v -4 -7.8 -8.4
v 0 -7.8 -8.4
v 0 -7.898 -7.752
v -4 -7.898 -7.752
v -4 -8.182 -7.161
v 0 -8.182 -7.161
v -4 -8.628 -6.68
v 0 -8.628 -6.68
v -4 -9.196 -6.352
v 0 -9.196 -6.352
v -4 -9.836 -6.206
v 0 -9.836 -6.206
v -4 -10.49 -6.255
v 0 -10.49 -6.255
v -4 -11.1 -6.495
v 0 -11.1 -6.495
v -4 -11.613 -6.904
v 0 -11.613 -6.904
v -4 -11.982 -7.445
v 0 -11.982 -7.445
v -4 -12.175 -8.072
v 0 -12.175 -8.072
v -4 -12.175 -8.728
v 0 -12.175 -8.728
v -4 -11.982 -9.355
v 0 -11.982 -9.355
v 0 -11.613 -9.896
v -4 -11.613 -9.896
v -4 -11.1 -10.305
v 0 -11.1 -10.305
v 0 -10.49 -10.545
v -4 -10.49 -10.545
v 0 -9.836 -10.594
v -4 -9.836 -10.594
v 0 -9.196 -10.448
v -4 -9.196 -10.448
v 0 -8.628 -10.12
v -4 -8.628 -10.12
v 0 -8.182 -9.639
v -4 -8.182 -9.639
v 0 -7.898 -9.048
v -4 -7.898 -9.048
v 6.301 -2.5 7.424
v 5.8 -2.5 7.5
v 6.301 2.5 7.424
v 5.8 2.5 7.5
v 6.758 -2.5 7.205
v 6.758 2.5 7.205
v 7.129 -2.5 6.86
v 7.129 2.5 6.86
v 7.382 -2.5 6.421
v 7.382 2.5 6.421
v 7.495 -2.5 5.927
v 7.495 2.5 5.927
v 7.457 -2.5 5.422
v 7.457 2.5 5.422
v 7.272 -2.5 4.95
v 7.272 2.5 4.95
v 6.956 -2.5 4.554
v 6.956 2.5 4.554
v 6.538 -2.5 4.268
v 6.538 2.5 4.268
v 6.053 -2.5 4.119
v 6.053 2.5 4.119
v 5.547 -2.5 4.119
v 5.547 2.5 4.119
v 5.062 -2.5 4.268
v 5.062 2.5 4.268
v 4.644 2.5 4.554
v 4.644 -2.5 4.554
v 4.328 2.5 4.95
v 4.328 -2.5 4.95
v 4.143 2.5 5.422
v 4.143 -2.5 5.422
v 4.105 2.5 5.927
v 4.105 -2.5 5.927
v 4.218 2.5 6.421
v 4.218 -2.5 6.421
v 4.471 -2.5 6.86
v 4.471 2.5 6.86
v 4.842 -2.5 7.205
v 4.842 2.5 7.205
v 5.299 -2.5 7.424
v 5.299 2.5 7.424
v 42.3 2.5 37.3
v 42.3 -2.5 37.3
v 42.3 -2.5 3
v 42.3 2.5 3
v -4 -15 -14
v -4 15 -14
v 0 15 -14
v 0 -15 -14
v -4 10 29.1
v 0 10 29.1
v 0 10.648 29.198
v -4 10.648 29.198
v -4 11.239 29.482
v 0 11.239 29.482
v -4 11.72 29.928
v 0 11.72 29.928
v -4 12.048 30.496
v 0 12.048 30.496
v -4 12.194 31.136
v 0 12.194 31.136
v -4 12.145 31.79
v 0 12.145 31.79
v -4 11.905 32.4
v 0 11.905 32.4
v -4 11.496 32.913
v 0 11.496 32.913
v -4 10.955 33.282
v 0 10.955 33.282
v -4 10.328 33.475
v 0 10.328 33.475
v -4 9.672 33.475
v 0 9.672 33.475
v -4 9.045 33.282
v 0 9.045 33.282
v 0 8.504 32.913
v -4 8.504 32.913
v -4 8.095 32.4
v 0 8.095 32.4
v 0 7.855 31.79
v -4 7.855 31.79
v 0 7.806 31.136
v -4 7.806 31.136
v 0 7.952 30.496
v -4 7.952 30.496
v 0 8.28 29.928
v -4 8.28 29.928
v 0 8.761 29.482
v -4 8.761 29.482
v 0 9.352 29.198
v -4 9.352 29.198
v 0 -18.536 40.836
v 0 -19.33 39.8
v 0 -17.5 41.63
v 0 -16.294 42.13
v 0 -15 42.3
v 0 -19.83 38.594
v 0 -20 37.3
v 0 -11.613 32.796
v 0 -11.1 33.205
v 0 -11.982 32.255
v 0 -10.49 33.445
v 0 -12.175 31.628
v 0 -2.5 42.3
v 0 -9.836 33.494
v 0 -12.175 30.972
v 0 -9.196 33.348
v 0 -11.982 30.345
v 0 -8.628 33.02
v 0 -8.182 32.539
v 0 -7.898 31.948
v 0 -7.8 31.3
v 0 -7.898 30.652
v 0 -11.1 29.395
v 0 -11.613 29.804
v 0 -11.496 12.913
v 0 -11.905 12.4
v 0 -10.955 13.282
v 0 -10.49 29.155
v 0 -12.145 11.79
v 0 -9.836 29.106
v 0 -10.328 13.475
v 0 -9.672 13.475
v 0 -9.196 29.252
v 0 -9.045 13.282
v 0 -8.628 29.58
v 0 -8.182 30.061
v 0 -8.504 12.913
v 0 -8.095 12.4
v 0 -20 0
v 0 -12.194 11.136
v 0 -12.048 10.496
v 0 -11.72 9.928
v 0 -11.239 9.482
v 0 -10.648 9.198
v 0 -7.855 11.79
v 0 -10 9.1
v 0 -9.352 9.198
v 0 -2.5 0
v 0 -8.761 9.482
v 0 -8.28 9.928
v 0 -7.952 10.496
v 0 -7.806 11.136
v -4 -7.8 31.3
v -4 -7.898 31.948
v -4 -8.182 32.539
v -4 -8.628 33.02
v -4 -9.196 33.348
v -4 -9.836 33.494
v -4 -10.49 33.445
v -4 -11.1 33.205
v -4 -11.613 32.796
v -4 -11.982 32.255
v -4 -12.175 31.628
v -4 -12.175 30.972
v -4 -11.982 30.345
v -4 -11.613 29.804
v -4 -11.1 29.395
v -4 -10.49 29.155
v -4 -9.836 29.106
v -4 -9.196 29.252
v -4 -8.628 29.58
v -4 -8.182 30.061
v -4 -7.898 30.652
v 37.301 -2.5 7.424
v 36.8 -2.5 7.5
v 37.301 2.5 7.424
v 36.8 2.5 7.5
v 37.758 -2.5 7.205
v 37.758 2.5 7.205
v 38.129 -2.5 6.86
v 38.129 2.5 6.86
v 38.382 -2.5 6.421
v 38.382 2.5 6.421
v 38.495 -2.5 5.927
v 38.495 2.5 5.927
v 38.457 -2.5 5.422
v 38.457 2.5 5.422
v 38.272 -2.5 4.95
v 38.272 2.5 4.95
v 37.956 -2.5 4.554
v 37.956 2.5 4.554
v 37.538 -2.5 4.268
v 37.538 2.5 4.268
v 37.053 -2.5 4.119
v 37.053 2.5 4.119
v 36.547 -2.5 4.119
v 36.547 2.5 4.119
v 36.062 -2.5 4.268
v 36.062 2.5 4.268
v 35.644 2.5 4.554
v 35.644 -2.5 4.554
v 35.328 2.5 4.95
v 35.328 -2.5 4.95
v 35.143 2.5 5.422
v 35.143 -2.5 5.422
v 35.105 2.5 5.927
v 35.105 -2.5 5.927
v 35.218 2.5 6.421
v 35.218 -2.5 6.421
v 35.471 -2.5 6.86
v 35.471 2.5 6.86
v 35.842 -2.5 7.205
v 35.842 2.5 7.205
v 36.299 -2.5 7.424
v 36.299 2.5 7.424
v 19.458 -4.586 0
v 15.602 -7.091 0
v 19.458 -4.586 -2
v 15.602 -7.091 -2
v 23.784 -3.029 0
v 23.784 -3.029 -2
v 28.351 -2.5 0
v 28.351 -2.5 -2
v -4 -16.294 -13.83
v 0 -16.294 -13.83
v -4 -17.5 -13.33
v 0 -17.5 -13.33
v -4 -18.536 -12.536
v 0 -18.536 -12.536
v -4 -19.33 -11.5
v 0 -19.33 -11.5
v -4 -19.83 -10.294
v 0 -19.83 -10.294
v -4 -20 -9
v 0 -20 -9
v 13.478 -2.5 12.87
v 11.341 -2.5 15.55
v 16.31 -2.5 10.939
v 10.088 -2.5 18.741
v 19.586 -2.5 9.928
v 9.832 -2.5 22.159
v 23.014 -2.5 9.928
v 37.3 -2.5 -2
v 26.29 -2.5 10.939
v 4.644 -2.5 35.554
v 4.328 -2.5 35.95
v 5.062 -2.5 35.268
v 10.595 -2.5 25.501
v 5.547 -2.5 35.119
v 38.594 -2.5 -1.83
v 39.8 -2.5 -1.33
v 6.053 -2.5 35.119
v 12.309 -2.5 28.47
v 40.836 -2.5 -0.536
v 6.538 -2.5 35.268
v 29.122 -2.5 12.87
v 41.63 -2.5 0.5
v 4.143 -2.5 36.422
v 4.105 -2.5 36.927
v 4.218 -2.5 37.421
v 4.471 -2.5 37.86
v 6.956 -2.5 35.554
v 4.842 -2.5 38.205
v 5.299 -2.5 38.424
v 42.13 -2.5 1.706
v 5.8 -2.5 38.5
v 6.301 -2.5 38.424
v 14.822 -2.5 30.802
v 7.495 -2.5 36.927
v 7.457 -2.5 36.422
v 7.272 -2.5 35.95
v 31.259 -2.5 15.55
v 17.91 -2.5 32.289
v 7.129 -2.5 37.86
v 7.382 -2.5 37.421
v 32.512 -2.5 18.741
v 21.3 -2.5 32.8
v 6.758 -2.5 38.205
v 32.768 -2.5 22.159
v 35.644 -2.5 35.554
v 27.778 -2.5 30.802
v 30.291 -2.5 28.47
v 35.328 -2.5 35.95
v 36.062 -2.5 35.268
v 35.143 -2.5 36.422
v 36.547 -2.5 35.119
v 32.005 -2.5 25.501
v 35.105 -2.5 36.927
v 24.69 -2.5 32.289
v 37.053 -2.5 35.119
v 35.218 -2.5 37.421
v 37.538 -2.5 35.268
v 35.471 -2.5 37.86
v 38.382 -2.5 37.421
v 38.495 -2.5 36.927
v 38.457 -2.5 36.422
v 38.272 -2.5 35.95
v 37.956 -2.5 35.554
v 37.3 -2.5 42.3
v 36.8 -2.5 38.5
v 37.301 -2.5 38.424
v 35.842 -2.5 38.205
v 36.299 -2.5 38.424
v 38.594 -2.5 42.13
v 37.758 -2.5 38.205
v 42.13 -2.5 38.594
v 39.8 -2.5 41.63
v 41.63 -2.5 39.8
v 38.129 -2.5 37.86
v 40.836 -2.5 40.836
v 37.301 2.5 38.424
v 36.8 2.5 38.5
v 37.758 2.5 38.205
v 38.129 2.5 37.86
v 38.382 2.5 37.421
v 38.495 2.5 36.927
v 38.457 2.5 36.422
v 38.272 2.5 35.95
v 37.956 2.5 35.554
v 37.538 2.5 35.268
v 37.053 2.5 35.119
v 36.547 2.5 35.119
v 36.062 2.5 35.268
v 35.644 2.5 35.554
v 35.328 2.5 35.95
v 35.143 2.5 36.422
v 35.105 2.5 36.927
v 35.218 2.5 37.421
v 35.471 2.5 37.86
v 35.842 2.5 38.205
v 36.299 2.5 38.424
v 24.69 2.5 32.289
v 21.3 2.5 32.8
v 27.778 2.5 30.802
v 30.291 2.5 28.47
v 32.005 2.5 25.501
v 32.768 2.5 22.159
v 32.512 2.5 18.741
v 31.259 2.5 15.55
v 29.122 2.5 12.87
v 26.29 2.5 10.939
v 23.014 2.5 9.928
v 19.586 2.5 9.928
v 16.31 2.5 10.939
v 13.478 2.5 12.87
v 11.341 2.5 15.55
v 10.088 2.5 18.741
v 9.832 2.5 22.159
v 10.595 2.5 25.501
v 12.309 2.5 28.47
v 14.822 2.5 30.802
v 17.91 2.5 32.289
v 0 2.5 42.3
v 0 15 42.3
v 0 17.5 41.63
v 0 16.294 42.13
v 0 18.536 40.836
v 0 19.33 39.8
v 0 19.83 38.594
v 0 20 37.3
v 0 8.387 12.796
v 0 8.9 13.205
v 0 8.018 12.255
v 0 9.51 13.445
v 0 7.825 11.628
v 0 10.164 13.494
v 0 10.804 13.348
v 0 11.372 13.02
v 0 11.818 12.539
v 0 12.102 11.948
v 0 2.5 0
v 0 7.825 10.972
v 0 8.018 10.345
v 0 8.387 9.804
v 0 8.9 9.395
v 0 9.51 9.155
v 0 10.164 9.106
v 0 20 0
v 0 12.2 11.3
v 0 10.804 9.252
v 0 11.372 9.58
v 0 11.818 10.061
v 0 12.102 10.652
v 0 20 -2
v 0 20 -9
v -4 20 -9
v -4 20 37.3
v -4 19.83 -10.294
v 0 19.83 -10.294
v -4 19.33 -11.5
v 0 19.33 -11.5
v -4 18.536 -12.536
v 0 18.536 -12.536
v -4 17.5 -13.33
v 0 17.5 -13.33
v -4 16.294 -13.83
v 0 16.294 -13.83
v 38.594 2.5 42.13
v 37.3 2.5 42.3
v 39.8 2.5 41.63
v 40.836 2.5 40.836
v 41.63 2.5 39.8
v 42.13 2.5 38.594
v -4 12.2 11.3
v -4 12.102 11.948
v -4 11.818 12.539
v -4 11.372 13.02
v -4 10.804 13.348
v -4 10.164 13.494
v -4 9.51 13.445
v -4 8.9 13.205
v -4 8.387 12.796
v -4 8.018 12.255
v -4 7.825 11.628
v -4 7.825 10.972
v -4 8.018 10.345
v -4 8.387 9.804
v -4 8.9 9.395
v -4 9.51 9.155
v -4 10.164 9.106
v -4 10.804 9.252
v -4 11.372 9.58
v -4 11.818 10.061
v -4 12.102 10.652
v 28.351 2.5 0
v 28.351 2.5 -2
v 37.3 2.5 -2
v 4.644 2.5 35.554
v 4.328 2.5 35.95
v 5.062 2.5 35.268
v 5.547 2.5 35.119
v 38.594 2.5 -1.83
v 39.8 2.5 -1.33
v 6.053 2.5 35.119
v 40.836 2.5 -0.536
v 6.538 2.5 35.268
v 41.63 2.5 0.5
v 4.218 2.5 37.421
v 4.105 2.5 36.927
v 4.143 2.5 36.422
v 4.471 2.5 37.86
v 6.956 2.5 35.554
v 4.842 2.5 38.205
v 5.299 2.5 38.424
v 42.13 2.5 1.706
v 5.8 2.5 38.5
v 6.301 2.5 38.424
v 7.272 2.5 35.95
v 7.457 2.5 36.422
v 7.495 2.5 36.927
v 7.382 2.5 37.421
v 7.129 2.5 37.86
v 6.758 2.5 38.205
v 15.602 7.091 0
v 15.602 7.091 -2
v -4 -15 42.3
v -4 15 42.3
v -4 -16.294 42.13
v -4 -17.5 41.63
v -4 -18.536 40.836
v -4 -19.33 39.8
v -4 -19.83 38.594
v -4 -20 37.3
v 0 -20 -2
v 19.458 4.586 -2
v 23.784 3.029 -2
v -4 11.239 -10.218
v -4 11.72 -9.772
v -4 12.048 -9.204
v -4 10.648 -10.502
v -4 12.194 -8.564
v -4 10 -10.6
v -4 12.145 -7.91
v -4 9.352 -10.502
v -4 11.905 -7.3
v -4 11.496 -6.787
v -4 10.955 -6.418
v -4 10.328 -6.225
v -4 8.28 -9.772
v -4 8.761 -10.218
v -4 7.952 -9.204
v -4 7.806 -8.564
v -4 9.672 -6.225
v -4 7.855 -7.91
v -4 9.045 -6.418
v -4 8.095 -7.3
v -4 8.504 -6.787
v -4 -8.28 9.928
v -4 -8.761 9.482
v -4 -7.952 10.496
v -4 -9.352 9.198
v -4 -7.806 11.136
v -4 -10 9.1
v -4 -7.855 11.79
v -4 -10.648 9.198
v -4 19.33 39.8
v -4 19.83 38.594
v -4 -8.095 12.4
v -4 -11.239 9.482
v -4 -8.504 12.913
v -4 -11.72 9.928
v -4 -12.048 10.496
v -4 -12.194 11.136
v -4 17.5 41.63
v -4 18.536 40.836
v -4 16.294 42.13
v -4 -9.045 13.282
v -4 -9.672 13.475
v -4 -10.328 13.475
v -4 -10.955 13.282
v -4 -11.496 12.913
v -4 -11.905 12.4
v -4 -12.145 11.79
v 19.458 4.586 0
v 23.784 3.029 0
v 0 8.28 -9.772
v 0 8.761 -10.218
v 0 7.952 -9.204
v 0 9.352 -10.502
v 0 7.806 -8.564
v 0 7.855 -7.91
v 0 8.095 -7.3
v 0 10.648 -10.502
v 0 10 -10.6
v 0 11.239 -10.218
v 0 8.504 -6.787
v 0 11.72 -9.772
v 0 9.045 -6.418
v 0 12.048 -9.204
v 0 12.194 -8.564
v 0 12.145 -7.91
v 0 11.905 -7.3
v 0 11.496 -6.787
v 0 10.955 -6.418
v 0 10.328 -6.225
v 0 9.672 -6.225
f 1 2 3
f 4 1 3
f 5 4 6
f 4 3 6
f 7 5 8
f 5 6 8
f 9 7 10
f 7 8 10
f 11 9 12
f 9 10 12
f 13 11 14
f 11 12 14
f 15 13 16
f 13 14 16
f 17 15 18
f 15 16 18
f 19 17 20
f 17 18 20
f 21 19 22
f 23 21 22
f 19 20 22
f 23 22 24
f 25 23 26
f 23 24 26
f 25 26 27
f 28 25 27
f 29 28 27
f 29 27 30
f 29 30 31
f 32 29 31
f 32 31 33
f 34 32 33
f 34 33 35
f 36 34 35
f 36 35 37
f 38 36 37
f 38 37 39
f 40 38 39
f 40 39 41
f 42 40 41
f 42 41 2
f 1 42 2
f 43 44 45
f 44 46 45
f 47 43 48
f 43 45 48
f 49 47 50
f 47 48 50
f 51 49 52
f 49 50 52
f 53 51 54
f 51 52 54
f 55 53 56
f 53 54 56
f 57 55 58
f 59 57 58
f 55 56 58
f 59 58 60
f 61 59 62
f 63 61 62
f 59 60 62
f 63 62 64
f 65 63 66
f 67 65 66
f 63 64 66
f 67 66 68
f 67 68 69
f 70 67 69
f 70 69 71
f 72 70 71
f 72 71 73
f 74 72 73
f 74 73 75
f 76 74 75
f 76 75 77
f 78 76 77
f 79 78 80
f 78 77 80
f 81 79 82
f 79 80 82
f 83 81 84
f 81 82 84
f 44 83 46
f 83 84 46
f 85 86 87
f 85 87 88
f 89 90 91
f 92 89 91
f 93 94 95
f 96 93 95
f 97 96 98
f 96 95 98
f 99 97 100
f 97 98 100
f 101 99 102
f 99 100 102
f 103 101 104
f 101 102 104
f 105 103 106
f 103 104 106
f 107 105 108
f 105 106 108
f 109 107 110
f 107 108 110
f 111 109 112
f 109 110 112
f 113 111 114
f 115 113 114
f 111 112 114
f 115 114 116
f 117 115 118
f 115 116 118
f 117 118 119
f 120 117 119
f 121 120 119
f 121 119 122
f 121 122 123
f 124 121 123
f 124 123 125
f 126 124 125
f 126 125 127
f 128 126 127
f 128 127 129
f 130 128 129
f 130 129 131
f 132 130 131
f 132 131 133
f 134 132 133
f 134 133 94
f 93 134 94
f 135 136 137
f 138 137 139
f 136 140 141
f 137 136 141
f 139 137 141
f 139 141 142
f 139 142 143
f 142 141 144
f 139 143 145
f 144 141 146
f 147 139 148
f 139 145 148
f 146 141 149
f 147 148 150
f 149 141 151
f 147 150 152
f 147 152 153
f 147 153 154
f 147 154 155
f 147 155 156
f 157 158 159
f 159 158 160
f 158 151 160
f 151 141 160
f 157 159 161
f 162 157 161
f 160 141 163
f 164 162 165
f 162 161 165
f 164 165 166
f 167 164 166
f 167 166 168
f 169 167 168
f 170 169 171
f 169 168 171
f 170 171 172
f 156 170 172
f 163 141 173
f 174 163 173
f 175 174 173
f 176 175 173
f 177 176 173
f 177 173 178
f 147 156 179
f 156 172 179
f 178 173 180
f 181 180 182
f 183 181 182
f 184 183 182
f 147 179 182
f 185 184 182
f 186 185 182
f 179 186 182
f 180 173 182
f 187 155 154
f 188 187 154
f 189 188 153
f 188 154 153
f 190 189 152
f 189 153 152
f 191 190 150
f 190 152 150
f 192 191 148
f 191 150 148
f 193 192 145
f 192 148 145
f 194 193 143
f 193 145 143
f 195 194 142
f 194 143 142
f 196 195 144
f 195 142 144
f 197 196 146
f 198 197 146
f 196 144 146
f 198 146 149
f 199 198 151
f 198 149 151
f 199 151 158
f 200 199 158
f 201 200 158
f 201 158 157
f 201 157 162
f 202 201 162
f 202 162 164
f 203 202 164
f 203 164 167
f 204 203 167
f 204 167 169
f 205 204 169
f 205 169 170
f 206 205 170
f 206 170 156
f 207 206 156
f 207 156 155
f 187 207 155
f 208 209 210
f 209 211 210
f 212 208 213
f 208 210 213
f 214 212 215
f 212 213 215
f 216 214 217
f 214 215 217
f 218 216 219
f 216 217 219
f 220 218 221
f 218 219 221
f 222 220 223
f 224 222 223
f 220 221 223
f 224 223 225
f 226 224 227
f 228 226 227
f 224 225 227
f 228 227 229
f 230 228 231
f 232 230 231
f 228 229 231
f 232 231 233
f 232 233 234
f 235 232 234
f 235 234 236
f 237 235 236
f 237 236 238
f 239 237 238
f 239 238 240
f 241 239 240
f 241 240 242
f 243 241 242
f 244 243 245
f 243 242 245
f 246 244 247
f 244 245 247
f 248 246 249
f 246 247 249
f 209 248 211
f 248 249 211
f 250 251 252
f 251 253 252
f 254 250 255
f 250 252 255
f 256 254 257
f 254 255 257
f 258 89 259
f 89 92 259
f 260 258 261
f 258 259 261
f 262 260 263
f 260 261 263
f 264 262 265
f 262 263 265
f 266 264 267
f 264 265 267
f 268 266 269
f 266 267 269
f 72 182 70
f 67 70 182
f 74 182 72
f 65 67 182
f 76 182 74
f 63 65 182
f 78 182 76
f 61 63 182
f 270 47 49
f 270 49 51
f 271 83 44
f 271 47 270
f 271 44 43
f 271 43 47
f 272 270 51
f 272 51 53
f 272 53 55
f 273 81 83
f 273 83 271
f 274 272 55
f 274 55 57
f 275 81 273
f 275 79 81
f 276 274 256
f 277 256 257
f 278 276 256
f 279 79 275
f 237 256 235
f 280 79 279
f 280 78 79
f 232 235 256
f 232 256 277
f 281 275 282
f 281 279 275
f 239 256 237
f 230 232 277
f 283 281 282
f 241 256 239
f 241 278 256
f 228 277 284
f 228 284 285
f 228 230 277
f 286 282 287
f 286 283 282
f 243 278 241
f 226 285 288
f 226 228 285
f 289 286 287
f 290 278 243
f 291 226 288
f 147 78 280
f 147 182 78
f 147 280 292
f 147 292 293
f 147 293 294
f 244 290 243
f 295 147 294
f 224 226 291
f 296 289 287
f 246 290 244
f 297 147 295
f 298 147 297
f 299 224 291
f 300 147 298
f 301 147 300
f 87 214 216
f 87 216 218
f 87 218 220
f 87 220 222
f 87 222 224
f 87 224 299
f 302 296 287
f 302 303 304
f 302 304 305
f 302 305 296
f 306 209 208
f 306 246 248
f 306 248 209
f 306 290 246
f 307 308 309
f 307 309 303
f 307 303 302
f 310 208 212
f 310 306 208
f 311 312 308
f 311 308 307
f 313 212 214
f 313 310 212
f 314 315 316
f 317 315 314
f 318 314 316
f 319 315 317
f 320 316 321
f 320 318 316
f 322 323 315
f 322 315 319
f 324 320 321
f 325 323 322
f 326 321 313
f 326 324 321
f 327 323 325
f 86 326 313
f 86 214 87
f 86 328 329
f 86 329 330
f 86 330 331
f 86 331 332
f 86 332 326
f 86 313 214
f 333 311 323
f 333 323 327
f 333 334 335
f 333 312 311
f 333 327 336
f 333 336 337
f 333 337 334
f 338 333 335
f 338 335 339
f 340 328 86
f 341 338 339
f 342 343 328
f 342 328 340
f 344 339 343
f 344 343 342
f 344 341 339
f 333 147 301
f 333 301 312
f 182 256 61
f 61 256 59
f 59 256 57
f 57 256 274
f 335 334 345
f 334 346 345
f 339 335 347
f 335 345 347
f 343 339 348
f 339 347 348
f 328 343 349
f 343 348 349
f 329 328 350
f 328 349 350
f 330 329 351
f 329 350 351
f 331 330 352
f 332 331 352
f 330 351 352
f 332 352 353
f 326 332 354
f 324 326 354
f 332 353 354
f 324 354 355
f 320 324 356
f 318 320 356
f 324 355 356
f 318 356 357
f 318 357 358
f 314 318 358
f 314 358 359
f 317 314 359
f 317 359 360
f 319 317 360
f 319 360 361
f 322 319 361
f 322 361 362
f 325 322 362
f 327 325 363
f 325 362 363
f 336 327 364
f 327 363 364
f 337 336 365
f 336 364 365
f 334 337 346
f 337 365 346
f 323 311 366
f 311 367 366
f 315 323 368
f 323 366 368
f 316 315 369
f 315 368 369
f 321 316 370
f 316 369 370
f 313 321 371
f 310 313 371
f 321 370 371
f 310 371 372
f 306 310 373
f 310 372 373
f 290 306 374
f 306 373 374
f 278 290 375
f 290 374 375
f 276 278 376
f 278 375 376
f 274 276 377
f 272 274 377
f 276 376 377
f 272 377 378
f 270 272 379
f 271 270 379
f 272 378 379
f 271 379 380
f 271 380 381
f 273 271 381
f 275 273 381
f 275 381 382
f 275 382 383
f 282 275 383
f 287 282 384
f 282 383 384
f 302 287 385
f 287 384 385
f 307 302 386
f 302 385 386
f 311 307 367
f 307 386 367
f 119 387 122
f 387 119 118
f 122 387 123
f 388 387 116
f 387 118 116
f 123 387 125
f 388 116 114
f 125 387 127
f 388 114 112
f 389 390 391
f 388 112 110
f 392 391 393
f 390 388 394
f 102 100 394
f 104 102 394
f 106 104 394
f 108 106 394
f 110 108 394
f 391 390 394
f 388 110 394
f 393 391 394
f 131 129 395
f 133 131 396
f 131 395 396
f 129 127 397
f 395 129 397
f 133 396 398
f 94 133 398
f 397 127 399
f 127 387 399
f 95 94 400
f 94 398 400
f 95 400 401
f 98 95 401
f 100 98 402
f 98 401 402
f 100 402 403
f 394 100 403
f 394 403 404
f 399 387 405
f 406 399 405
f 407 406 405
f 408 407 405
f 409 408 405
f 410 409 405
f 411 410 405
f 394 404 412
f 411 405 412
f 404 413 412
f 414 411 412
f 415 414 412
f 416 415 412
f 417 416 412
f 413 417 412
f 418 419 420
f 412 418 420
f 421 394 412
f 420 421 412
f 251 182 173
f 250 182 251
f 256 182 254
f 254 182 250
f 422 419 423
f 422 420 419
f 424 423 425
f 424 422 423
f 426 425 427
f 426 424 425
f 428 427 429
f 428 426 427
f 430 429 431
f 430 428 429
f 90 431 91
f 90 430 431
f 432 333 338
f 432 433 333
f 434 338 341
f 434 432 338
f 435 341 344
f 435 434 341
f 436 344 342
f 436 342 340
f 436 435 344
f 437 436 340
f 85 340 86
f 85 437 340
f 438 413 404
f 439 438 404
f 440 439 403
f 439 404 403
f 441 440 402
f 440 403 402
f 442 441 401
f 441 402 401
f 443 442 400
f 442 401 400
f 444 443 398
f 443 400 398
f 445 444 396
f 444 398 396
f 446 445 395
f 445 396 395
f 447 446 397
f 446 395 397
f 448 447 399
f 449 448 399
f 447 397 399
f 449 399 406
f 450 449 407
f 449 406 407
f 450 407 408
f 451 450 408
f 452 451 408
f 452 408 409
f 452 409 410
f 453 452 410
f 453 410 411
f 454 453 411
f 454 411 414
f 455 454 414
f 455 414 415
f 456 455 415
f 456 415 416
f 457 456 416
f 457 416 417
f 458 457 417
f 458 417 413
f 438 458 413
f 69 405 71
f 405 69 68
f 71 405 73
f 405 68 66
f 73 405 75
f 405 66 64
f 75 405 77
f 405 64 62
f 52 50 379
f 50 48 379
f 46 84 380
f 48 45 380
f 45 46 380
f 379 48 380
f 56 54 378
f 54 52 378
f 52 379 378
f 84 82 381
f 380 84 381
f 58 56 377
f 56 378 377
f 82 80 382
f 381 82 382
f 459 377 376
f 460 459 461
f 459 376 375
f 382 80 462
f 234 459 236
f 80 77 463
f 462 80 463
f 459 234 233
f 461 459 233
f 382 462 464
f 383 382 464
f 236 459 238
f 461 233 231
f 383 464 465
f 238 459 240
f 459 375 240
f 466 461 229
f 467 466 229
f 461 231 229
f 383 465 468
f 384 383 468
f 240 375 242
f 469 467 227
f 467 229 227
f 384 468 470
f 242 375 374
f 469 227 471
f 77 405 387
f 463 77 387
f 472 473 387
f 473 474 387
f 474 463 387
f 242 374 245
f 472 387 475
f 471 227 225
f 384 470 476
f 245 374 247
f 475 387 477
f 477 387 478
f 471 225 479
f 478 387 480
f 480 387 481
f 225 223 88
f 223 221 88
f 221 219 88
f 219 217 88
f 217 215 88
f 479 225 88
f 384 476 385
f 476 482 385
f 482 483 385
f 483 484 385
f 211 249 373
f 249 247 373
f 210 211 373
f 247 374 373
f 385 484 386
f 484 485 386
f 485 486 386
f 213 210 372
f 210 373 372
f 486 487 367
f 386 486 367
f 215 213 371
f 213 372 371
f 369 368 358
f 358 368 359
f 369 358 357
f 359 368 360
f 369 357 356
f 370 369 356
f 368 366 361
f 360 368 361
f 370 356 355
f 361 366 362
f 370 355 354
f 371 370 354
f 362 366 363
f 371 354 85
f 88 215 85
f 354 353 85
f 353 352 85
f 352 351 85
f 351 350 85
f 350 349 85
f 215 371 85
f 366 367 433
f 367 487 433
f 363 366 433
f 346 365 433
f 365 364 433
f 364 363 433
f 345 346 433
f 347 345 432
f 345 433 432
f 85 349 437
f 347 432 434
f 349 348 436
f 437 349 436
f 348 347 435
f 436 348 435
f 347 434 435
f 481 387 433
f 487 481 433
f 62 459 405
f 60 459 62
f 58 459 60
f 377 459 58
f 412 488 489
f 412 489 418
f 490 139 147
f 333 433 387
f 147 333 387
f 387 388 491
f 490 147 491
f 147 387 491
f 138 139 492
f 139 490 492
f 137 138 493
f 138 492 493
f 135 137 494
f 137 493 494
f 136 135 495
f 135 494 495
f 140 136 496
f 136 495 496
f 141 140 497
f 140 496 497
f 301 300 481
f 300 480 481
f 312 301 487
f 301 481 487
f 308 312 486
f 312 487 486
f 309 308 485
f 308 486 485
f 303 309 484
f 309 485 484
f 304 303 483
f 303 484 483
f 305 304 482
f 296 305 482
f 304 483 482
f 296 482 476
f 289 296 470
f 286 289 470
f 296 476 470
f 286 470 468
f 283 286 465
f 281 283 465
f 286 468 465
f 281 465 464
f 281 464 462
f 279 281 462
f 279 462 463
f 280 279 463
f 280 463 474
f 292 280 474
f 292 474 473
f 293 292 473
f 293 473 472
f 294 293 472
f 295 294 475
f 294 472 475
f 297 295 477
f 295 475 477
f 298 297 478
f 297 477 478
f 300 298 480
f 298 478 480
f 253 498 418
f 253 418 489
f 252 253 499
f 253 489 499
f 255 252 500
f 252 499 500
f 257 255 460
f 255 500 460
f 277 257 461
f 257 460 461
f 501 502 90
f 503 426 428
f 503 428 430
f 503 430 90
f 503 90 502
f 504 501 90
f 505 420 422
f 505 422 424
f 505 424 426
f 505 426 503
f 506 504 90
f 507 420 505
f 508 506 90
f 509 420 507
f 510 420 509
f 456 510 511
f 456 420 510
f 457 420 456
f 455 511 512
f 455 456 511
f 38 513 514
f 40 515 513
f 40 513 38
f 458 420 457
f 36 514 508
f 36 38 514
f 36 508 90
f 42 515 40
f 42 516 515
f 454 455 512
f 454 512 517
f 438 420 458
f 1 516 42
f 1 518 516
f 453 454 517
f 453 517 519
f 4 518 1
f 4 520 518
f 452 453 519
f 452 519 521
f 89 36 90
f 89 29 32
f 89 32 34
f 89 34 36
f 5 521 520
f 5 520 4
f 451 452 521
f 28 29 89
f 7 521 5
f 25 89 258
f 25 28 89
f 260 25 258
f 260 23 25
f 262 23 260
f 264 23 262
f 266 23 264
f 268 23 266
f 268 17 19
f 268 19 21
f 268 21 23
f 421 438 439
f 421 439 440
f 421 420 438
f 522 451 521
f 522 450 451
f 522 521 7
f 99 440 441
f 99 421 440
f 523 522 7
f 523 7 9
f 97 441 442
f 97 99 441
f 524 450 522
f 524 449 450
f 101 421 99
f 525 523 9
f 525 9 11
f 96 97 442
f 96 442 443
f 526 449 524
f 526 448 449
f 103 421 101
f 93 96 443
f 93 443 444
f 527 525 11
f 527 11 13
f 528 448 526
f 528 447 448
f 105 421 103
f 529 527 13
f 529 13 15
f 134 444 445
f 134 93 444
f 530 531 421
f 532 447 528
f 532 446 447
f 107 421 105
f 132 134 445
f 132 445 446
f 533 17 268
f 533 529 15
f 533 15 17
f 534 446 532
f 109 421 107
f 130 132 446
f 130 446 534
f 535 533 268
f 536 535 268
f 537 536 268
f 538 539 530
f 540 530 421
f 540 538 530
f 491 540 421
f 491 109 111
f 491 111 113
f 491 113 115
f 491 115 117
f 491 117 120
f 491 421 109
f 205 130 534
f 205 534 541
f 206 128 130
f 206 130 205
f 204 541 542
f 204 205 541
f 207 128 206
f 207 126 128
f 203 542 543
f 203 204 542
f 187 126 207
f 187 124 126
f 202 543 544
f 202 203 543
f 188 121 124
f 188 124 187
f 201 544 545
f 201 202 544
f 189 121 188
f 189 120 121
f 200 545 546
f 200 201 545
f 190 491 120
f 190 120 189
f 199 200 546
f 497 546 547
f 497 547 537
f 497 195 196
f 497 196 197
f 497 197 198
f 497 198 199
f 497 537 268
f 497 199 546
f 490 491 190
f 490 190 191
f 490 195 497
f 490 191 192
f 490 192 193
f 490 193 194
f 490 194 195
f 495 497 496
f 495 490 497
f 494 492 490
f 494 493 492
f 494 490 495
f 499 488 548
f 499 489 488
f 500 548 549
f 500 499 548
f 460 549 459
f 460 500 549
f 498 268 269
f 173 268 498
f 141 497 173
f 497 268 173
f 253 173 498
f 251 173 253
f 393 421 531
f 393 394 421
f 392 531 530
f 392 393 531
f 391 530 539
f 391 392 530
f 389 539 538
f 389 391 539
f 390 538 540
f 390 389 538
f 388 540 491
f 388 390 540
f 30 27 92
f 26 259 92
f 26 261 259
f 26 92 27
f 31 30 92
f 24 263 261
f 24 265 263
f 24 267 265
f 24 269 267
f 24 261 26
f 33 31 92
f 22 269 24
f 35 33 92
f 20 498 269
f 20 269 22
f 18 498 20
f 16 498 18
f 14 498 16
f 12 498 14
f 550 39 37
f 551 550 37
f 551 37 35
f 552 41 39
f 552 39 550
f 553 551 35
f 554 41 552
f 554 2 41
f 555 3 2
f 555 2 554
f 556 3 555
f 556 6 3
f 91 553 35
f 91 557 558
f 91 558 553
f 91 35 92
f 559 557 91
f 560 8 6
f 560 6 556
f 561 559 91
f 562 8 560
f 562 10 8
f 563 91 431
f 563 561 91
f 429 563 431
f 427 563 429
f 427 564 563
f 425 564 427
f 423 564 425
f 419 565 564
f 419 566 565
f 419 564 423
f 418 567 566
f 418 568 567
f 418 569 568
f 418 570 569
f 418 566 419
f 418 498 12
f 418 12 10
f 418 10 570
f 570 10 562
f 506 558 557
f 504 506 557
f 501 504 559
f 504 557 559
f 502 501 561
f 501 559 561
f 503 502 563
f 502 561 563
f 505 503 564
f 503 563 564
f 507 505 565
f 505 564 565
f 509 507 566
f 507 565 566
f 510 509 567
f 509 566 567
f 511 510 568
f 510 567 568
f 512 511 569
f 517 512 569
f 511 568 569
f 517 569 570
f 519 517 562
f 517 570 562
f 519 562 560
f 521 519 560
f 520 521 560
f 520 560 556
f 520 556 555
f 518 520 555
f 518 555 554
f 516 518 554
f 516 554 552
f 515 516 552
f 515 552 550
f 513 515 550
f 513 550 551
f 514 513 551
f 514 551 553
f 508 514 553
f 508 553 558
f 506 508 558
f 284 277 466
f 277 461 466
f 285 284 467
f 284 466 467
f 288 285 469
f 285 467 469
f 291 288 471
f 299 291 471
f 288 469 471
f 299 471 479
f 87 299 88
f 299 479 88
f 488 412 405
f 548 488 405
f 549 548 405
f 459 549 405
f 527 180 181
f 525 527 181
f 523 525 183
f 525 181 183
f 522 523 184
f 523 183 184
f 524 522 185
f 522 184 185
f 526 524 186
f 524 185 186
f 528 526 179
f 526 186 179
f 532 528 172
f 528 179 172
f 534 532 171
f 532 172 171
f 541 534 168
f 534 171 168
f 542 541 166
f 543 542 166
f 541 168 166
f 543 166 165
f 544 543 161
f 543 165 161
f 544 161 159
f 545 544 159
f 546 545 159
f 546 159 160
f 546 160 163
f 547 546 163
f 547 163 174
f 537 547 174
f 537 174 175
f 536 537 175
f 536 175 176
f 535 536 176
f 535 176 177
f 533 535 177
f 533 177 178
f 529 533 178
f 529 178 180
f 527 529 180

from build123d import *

# Parameters (mm, degrees)
SKETCH_1_W                      = 42.3
SKETCH_1_H                      = 5
SKETCH_1_W_2                    = 21.15
EXTRUDE_1_DEPTH                 = 42.3
CUT_EXTRUDE_1_REACH             = 65.076
SKETCH_2_R                      = 11.5
SKETCH_2_R_2                    = 1.7
CUT_EXTRUDE_1_DIRECTION_2_REACH = 65.076
SKETCH_1_3_W                    = 42.3
SKETCH_1_3_H                    = 5
SKETCH_1_3_W_2                  = 21.15
EXTRUDE_2_DEPTH                 = 2
EXTRUDE_START                   = -2
EXTRUDE_3_DEPTH                 = 12
CUT_EXTRUDE_2_REACH             = 65.076
SKETCH_4_R                      = 2.2
FILLET_1_R                      = 5
FILLET_2_R                      = 20


with BuildPart() as part:
    # 草图1 → 凸台-拉伸1 (new body)
    with BuildSketch(Plane.XY):
        Polygon((0, 2.5), (0, -2.5), (0, -20), (-4, -20), (-4, 20), (0, 20), align=None)
        with Locations((21.15, 0)):
            Rectangle(SKETCH_1_W, SKETCH_1_H)
        Polygon((-4, 0), (0, 0), (0, 2.5), (0, 20), (-4, 20), align=None)
        with Locations((31.725, 0)):
            Rectangle(SKETCH_1_W_2, SKETCH_1_H)
    extrude(amount=EXTRUDE_1_DEPTH)

    # 草图2 → 切除-拉伸1 (cut, up to next)
    with BuildSketch(Plane(origin=(0, 0, 0), x_dir=(1, 0, 0), z_dir=(0, 1, 0)), mode=Mode.PRIVATE) as cut_extrude_1_sk1:
        with Locations(Location((21.3, -21.3, 0), (0, 0, 270))):
            Circle(SKETCH_2_R)
    cut_extrude_1_tool1 = extrude(cut_extrude_1_sk1.sketch, amount=CUT_EXTRUDE_1_REACH, mode=Mode.PRIVATE) & part.part
    # 草图2 → 切除-拉伸1 (cut, up to next)
    with BuildSketch(Plane(origin=(0, 0, 0), x_dir=(1, 0, 0), z_dir=(0, 1, 0)), mode=Mode.PRIVATE) as cut_extrude_1_sk2:
        with Locations(Location((36.8, -5.8, 0), (0, 0, 270))):
            Circle(SKETCH_2_R_2)
    cut_extrude_1_tool2 = extrude(cut_extrude_1_sk2.sketch, amount=CUT_EXTRUDE_1_REACH, mode=Mode.PRIVATE) & part.part
    # 草图2 → 切除-拉伸1 (cut, up to next)
    with BuildSketch(Plane(origin=(0, 0, 0), x_dir=(1, 0, 0), z_dir=(0, 1, 0)), mode=Mode.PRIVATE) as cut_extrude_1_sk3:
        with Locations(Location((36.8, -36.8, 0), (0, 0, 270))):
            Circle(SKETCH_2_R_2)
    cut_extrude_1_tool3 = extrude(cut_extrude_1_sk3.sketch, amount=CUT_EXTRUDE_1_REACH, mode=Mode.PRIVATE) & part.part
    # 草图2 → 切除-拉伸1 (cut, up to next)
    with BuildSketch(Plane(origin=(0, 0, 0), x_dir=(1, 0, 0), z_dir=(0, 1, 0)), mode=Mode.PRIVATE) as cut_extrude_1_sk4:
        with Locations(Location((5.8, -36.8, 0), (0, 0, 270))):
            Circle(SKETCH_2_R_2)
    cut_extrude_1_tool4 = extrude(cut_extrude_1_sk4.sketch, amount=CUT_EXTRUDE_1_REACH, mode=Mode.PRIVATE) & part.part
    # 草图2 → 切除-拉伸1 (cut, up to next)
    with BuildSketch(Plane(origin=(0, 0, 0), x_dir=(1, 0, 0), z_dir=(0, 1, 0)), mode=Mode.PRIVATE) as cut_extrude_1_sk5:
        with Locations(Location((5.8, -5.8, 0), (0, 0, 270))):
            Circle(SKETCH_2_R_2)
    cut_extrude_1_tool5 = extrude(cut_extrude_1_sk5.sketch, amount=CUT_EXTRUDE_1_REACH, mode=Mode.PRIVATE) & part.part
    add(cut_extrude_1_tool1.solids().sort_by_distance((21.3, 0, 21.3))[0], mode=Mode.SUBTRACT)
    add(cut_extrude_1_tool2.solids().sort_by_distance((36.8, 0, 5.8))[0], mode=Mode.SUBTRACT)
    add(cut_extrude_1_tool3.solids().sort_by_distance((36.8, 0, 36.8))[0], mode=Mode.SUBTRACT)
    add(cut_extrude_1_tool4.solids().sort_by_distance((5.8, 0, 36.8))[0], mode=Mode.SUBTRACT)
    add(cut_extrude_1_tool5.solids().sort_by_distance((5.8, 0, 5.8))[0], mode=Mode.SUBTRACT)

    # 草图2 → 切除-拉伸1 direction 2 (cut, up to next)
    with BuildSketch(Plane(origin=(0, 0, 0), x_dir=(1, 0, 0), z_dir=(0, 1, 0)), mode=Mode.PRIVATE) as cut_extrude_1_direction_2_sk1:
        with Locations(Location((21.3, -21.3, 0), (0, 0, 270))):
            Circle(SKETCH_2_R)
    cut_extrude_1_direction_2_tool1 = extrude(cut_extrude_1_direction_2_sk1.sketch, amount=-CUT_EXTRUDE_1_DIRECTION_2_REACH, mode=Mode.PRIVATE) & part.part
    # 草图2 → 切除-拉伸1 direction 2 (cut, up to next)
    with BuildSketch(Plane(origin=(0, 0, 0), x_dir=(1, 0, 0), z_dir=(0, 1, 0)), mode=Mode.PRIVATE) as cut_extrude_1_direction_2_sk2:
        with Locations(Location((36.8, -5.8, 0), (0, 0, 270))):
            Circle(SKETCH_2_R_2)
    cut_extrude_1_direction_2_tool2 = extrude(cut_extrude_1_direction_2_sk2.sketch, amount=-CUT_EXTRUDE_1_DIRECTION_2_REACH, mode=Mode.PRIVATE) & part.part
    # 草图2 → 切除-拉伸1 direction 2 (cut, up to next)
    with BuildSketch(Plane(origin=(0, 0, 0), x_dir=(1, 0, 0), z_dir=(0, 1, 0)), mode=Mode.PRIVATE) as cut_extrude_1_direction_2_sk3:
        with Locations(Location((36.8, -36.8, 0), (0, 0, 270))):
            Circle(SKETCH_2_R_2)
    cut_extrude_1_direction_2_tool3 = extrude(cut_extrude_1_direction_2_sk3.sketch, amount=-CUT_EXTRUDE_1_DIRECTION_2_REACH, mode=Mode.PRIVATE) & part.part
    # 草图2 → 切除-拉伸1 direction 2 (cut, up to next)
    with BuildSketch(Plane(origin=(0, 0, 0), x_dir=(1, 0, 0), z_dir=(0, 1, 0)), mode=Mode.PRIVATE) as cut_extrude_1_direction_2_sk4:
        with Locations(Location((5.8, -36.8, 0), (0, 0, 270))):
            Circle(SKETCH_2_R_2)
    cut_extrude_1_direction_2_tool4 = extrude(cut_extrude_1_direction_2_sk4.sketch, amount=-CUT_EXTRUDE_1_DIRECTION_2_REACH, mode=Mode.PRIVATE) & part.part
    # 草图2 → 切除-拉伸1 direction 2 (cut, up to next)
    with BuildSketch(Plane(origin=(0, 0, 0), x_dir=(1, 0, 0), z_dir=(0, 1, 0)), mode=Mode.PRIVATE) as cut_extrude_1_direction_2_sk5:
        with Locations(Location((5.8, -5.8, 0), (0, 0, 270))):
            Circle(SKETCH_2_R_2)
    cut_extrude_1_direction_2_tool5 = extrude(cut_extrude_1_direction_2_sk5.sketch, amount=-CUT_EXTRUDE_1_DIRECTION_2_REACH, mode=Mode.PRIVATE) & part.part
    add(cut_extrude_1_direction_2_tool1.solids().sort_by_distance((21.3, 0, 21.3))[0], mode=Mode.SUBTRACT)
    add(cut_extrude_1_direction_2_tool2.solids().sort_by_distance((36.8, 0, 5.8))[0], mode=Mode.SUBTRACT)
    add(cut_extrude_1_direction_2_tool3.solids().sort_by_distance((36.8, 0, 36.8))[0], mode=Mode.SUBTRACT)
    add(cut_extrude_1_direction_2_tool4.solids().sort_by_distance((5.8, 0, 36.8))[0], mode=Mode.SUBTRACT)
    add(cut_extrude_1_direction_2_tool5.solids().sort_by_distance((5.8, 0, 5.8))[0], mode=Mode.SUBTRACT)

    # 草图1<3> → 凸台-拉伸2 (add)
    with BuildSketch(Plane.XY):
        Polygon((0, 2.5), (21.15, 2.5), (0, 20), align=None)
        Polygon((21.15, -2.5), (0, -2.5), (0, -20), align=None)
        Polygon((0, -20), (0, -2.5), (0, 0), (-4, 0), (-4, -20), align=None)
        Polygon((-4, 0), (0, 0), (0, 2.5), (0, 20), (-4, 20), align=None)
        with Locations((21.15, 0)):
            Rectangle(SKETCH_1_3_W, SKETCH_1_3_H)
        with Locations((31.725, 0)):
            Rectangle(SKETCH_1_3_W_2, SKETCH_1_3_H)
    extrude(amount=-EXTRUDE_2_DEPTH)

    # 草图1<4> → 凸台-拉伸3 (add)
    with BuildSketch(Plane.XY.offset(EXTRUDE_START)):
        Polygon((-4, 0), (0, 0), (0, 2.5), (0, 20), (-4, 20), align=None)
        Polygon((0, -20), (0, -2.5), (0, 0), (-4, 0), (-4, -20), align=None)
    extrude(amount=-EXTRUDE_3_DEPTH)

    # 草图4 → 切除-拉伸2 (cut, up to next)
    with BuildSketch(Plane(origin=(0, 0, 0), x_dir=(0, 0, -1), z_dir=(1, 0, 0)), mode=Mode.PRIVATE) as cut_extrude_2_sk1:
        with Locations((8.4, 10)):
            Circle(SKETCH_4_R)
    cut_extrude_2_tool1 = extrude(cut_extrude_2_sk1.sketch, amount=-CUT_EXTRUDE_2_REACH, mode=Mode.PRIVATE) & part.part
    # 草图4 → 切除-拉伸2 (cut, up to next)
    with BuildSketch(Plane(origin=(0, 0, 0), x_dir=(0, 0, -1), z_dir=(1, 0, 0)), mode=Mode.PRIVATE) as cut_extrude_2_sk2:
        with Locations(Location((8.4, -10, 0), (0, 0, 90))):
            Circle(SKETCH_4_R)
    cut_extrude_2_tool2 = extrude(cut_extrude_2_sk2.sketch, amount=-CUT_EXTRUDE_2_REACH, mode=Mode.PRIVATE) & part.part
    # 草图4 → 切除-拉伸2 (cut, up to next)
    with BuildSketch(Plane(origin=(0, 0, 0), x_dir=(0, 0, -1), z_dir=(1, 0, 0)), mode=Mode.PRIVATE) as cut_extrude_2_sk3:
        with Locations(Location((-11.3, 10, 0), (0, 0, 90))):
            Circle(SKETCH_4_R)
    cut_extrude_2_tool3 = extrude(cut_extrude_2_sk3.sketch, amount=-CUT_EXTRUDE_2_REACH, mode=Mode.PRIVATE) & part.part
    # 草图4 → 切除-拉伸2 (cut, up to next)
    with BuildSketch(Plane(origin=(0, 0, 0), x_dir=(0, 0, -1), z_dir=(1, 0, 0)), mode=Mode.PRIVATE) as cut_extrude_2_sk4:
        with Locations((-11.3, -10)):
            Circle(SKETCH_4_R)
    cut_extrude_2_tool4 = extrude(cut_extrude_2_sk4.sketch, amount=-CUT_EXTRUDE_2_REACH, mode=Mode.PRIVATE) & part.part
    # 草图4 → 切除-拉伸2 (cut, up to next)
    with BuildSketch(Plane(origin=(0, 0, 0), x_dir=(0, 0, -1), z_dir=(1, 0, 0)), mode=Mode.PRIVATE) as cut_extrude_2_sk5:
        with Locations((-31.3, 10)):
            Circle(SKETCH_4_R)
    cut_extrude_2_tool5 = extrude(cut_extrude_2_sk5.sketch, amount=-CUT_EXTRUDE_2_REACH, mode=Mode.PRIVATE) & part.part
    # 草图4 → 切除-拉伸2 (cut, up to next)
    with BuildSketch(Plane(origin=(0, 0, 0), x_dir=(0, 0, -1), z_dir=(1, 0, 0)), mode=Mode.PRIVATE) as cut_extrude_2_sk6:
        with Locations(Location((-31.3, -10, 0), (0, 0, 90))):
            Circle(SKETCH_4_R)
    cut_extrude_2_tool6 = extrude(cut_extrude_2_sk6.sketch, amount=-CUT_EXTRUDE_2_REACH, mode=Mode.PRIVATE) & part.part
    add(cut_extrude_2_tool1.solids().sort_by_distance((0, 10, -8.4))[0], mode=Mode.SUBTRACT)
    add(cut_extrude_2_tool2.solids().sort_by_distance((0, -10, -8.4))[0], mode=Mode.SUBTRACT)
    add(cut_extrude_2_tool3.solids().sort_by_distance((0, 10, 11.3))[0], mode=Mode.SUBTRACT)
    add(cut_extrude_2_tool4.solids().sort_by_distance((0, -10, 11.3))[0], mode=Mode.SUBTRACT)
    add(cut_extrude_2_tool5.solids().sort_by_distance((0, 10, 31.3))[0], mode=Mode.SUBTRACT)
    add(cut_extrude_2_tool6.solids().sort_by_distance((0, -10, 31.3))[0], mode=Mode.SUBTRACT)

    # 圆角1
    fillet_1_edges = [part.edges().sort_by_distance(p)[0] for p in [
        (42.3, 0, 42.3),
        (-2, 20, 42.3),
        (-2, -20, 42.3),
        (42.3, 0, -2),
        (-2, -20, -14),
        (-2, 20, -14),
    ]]
    fillet(fillet_1_edges, radius=FILLET_1_R)

    # 圆角2
    fillet_2_edges = [part.edges().sort_by_distance(p)[0] for p in [
        (21.15, 2.5, -1),
        (21.15, -2.5, -1),
    ]]
    fillet(fillet_2_edges, radius=FILLET_2_R)


solid = part.part
